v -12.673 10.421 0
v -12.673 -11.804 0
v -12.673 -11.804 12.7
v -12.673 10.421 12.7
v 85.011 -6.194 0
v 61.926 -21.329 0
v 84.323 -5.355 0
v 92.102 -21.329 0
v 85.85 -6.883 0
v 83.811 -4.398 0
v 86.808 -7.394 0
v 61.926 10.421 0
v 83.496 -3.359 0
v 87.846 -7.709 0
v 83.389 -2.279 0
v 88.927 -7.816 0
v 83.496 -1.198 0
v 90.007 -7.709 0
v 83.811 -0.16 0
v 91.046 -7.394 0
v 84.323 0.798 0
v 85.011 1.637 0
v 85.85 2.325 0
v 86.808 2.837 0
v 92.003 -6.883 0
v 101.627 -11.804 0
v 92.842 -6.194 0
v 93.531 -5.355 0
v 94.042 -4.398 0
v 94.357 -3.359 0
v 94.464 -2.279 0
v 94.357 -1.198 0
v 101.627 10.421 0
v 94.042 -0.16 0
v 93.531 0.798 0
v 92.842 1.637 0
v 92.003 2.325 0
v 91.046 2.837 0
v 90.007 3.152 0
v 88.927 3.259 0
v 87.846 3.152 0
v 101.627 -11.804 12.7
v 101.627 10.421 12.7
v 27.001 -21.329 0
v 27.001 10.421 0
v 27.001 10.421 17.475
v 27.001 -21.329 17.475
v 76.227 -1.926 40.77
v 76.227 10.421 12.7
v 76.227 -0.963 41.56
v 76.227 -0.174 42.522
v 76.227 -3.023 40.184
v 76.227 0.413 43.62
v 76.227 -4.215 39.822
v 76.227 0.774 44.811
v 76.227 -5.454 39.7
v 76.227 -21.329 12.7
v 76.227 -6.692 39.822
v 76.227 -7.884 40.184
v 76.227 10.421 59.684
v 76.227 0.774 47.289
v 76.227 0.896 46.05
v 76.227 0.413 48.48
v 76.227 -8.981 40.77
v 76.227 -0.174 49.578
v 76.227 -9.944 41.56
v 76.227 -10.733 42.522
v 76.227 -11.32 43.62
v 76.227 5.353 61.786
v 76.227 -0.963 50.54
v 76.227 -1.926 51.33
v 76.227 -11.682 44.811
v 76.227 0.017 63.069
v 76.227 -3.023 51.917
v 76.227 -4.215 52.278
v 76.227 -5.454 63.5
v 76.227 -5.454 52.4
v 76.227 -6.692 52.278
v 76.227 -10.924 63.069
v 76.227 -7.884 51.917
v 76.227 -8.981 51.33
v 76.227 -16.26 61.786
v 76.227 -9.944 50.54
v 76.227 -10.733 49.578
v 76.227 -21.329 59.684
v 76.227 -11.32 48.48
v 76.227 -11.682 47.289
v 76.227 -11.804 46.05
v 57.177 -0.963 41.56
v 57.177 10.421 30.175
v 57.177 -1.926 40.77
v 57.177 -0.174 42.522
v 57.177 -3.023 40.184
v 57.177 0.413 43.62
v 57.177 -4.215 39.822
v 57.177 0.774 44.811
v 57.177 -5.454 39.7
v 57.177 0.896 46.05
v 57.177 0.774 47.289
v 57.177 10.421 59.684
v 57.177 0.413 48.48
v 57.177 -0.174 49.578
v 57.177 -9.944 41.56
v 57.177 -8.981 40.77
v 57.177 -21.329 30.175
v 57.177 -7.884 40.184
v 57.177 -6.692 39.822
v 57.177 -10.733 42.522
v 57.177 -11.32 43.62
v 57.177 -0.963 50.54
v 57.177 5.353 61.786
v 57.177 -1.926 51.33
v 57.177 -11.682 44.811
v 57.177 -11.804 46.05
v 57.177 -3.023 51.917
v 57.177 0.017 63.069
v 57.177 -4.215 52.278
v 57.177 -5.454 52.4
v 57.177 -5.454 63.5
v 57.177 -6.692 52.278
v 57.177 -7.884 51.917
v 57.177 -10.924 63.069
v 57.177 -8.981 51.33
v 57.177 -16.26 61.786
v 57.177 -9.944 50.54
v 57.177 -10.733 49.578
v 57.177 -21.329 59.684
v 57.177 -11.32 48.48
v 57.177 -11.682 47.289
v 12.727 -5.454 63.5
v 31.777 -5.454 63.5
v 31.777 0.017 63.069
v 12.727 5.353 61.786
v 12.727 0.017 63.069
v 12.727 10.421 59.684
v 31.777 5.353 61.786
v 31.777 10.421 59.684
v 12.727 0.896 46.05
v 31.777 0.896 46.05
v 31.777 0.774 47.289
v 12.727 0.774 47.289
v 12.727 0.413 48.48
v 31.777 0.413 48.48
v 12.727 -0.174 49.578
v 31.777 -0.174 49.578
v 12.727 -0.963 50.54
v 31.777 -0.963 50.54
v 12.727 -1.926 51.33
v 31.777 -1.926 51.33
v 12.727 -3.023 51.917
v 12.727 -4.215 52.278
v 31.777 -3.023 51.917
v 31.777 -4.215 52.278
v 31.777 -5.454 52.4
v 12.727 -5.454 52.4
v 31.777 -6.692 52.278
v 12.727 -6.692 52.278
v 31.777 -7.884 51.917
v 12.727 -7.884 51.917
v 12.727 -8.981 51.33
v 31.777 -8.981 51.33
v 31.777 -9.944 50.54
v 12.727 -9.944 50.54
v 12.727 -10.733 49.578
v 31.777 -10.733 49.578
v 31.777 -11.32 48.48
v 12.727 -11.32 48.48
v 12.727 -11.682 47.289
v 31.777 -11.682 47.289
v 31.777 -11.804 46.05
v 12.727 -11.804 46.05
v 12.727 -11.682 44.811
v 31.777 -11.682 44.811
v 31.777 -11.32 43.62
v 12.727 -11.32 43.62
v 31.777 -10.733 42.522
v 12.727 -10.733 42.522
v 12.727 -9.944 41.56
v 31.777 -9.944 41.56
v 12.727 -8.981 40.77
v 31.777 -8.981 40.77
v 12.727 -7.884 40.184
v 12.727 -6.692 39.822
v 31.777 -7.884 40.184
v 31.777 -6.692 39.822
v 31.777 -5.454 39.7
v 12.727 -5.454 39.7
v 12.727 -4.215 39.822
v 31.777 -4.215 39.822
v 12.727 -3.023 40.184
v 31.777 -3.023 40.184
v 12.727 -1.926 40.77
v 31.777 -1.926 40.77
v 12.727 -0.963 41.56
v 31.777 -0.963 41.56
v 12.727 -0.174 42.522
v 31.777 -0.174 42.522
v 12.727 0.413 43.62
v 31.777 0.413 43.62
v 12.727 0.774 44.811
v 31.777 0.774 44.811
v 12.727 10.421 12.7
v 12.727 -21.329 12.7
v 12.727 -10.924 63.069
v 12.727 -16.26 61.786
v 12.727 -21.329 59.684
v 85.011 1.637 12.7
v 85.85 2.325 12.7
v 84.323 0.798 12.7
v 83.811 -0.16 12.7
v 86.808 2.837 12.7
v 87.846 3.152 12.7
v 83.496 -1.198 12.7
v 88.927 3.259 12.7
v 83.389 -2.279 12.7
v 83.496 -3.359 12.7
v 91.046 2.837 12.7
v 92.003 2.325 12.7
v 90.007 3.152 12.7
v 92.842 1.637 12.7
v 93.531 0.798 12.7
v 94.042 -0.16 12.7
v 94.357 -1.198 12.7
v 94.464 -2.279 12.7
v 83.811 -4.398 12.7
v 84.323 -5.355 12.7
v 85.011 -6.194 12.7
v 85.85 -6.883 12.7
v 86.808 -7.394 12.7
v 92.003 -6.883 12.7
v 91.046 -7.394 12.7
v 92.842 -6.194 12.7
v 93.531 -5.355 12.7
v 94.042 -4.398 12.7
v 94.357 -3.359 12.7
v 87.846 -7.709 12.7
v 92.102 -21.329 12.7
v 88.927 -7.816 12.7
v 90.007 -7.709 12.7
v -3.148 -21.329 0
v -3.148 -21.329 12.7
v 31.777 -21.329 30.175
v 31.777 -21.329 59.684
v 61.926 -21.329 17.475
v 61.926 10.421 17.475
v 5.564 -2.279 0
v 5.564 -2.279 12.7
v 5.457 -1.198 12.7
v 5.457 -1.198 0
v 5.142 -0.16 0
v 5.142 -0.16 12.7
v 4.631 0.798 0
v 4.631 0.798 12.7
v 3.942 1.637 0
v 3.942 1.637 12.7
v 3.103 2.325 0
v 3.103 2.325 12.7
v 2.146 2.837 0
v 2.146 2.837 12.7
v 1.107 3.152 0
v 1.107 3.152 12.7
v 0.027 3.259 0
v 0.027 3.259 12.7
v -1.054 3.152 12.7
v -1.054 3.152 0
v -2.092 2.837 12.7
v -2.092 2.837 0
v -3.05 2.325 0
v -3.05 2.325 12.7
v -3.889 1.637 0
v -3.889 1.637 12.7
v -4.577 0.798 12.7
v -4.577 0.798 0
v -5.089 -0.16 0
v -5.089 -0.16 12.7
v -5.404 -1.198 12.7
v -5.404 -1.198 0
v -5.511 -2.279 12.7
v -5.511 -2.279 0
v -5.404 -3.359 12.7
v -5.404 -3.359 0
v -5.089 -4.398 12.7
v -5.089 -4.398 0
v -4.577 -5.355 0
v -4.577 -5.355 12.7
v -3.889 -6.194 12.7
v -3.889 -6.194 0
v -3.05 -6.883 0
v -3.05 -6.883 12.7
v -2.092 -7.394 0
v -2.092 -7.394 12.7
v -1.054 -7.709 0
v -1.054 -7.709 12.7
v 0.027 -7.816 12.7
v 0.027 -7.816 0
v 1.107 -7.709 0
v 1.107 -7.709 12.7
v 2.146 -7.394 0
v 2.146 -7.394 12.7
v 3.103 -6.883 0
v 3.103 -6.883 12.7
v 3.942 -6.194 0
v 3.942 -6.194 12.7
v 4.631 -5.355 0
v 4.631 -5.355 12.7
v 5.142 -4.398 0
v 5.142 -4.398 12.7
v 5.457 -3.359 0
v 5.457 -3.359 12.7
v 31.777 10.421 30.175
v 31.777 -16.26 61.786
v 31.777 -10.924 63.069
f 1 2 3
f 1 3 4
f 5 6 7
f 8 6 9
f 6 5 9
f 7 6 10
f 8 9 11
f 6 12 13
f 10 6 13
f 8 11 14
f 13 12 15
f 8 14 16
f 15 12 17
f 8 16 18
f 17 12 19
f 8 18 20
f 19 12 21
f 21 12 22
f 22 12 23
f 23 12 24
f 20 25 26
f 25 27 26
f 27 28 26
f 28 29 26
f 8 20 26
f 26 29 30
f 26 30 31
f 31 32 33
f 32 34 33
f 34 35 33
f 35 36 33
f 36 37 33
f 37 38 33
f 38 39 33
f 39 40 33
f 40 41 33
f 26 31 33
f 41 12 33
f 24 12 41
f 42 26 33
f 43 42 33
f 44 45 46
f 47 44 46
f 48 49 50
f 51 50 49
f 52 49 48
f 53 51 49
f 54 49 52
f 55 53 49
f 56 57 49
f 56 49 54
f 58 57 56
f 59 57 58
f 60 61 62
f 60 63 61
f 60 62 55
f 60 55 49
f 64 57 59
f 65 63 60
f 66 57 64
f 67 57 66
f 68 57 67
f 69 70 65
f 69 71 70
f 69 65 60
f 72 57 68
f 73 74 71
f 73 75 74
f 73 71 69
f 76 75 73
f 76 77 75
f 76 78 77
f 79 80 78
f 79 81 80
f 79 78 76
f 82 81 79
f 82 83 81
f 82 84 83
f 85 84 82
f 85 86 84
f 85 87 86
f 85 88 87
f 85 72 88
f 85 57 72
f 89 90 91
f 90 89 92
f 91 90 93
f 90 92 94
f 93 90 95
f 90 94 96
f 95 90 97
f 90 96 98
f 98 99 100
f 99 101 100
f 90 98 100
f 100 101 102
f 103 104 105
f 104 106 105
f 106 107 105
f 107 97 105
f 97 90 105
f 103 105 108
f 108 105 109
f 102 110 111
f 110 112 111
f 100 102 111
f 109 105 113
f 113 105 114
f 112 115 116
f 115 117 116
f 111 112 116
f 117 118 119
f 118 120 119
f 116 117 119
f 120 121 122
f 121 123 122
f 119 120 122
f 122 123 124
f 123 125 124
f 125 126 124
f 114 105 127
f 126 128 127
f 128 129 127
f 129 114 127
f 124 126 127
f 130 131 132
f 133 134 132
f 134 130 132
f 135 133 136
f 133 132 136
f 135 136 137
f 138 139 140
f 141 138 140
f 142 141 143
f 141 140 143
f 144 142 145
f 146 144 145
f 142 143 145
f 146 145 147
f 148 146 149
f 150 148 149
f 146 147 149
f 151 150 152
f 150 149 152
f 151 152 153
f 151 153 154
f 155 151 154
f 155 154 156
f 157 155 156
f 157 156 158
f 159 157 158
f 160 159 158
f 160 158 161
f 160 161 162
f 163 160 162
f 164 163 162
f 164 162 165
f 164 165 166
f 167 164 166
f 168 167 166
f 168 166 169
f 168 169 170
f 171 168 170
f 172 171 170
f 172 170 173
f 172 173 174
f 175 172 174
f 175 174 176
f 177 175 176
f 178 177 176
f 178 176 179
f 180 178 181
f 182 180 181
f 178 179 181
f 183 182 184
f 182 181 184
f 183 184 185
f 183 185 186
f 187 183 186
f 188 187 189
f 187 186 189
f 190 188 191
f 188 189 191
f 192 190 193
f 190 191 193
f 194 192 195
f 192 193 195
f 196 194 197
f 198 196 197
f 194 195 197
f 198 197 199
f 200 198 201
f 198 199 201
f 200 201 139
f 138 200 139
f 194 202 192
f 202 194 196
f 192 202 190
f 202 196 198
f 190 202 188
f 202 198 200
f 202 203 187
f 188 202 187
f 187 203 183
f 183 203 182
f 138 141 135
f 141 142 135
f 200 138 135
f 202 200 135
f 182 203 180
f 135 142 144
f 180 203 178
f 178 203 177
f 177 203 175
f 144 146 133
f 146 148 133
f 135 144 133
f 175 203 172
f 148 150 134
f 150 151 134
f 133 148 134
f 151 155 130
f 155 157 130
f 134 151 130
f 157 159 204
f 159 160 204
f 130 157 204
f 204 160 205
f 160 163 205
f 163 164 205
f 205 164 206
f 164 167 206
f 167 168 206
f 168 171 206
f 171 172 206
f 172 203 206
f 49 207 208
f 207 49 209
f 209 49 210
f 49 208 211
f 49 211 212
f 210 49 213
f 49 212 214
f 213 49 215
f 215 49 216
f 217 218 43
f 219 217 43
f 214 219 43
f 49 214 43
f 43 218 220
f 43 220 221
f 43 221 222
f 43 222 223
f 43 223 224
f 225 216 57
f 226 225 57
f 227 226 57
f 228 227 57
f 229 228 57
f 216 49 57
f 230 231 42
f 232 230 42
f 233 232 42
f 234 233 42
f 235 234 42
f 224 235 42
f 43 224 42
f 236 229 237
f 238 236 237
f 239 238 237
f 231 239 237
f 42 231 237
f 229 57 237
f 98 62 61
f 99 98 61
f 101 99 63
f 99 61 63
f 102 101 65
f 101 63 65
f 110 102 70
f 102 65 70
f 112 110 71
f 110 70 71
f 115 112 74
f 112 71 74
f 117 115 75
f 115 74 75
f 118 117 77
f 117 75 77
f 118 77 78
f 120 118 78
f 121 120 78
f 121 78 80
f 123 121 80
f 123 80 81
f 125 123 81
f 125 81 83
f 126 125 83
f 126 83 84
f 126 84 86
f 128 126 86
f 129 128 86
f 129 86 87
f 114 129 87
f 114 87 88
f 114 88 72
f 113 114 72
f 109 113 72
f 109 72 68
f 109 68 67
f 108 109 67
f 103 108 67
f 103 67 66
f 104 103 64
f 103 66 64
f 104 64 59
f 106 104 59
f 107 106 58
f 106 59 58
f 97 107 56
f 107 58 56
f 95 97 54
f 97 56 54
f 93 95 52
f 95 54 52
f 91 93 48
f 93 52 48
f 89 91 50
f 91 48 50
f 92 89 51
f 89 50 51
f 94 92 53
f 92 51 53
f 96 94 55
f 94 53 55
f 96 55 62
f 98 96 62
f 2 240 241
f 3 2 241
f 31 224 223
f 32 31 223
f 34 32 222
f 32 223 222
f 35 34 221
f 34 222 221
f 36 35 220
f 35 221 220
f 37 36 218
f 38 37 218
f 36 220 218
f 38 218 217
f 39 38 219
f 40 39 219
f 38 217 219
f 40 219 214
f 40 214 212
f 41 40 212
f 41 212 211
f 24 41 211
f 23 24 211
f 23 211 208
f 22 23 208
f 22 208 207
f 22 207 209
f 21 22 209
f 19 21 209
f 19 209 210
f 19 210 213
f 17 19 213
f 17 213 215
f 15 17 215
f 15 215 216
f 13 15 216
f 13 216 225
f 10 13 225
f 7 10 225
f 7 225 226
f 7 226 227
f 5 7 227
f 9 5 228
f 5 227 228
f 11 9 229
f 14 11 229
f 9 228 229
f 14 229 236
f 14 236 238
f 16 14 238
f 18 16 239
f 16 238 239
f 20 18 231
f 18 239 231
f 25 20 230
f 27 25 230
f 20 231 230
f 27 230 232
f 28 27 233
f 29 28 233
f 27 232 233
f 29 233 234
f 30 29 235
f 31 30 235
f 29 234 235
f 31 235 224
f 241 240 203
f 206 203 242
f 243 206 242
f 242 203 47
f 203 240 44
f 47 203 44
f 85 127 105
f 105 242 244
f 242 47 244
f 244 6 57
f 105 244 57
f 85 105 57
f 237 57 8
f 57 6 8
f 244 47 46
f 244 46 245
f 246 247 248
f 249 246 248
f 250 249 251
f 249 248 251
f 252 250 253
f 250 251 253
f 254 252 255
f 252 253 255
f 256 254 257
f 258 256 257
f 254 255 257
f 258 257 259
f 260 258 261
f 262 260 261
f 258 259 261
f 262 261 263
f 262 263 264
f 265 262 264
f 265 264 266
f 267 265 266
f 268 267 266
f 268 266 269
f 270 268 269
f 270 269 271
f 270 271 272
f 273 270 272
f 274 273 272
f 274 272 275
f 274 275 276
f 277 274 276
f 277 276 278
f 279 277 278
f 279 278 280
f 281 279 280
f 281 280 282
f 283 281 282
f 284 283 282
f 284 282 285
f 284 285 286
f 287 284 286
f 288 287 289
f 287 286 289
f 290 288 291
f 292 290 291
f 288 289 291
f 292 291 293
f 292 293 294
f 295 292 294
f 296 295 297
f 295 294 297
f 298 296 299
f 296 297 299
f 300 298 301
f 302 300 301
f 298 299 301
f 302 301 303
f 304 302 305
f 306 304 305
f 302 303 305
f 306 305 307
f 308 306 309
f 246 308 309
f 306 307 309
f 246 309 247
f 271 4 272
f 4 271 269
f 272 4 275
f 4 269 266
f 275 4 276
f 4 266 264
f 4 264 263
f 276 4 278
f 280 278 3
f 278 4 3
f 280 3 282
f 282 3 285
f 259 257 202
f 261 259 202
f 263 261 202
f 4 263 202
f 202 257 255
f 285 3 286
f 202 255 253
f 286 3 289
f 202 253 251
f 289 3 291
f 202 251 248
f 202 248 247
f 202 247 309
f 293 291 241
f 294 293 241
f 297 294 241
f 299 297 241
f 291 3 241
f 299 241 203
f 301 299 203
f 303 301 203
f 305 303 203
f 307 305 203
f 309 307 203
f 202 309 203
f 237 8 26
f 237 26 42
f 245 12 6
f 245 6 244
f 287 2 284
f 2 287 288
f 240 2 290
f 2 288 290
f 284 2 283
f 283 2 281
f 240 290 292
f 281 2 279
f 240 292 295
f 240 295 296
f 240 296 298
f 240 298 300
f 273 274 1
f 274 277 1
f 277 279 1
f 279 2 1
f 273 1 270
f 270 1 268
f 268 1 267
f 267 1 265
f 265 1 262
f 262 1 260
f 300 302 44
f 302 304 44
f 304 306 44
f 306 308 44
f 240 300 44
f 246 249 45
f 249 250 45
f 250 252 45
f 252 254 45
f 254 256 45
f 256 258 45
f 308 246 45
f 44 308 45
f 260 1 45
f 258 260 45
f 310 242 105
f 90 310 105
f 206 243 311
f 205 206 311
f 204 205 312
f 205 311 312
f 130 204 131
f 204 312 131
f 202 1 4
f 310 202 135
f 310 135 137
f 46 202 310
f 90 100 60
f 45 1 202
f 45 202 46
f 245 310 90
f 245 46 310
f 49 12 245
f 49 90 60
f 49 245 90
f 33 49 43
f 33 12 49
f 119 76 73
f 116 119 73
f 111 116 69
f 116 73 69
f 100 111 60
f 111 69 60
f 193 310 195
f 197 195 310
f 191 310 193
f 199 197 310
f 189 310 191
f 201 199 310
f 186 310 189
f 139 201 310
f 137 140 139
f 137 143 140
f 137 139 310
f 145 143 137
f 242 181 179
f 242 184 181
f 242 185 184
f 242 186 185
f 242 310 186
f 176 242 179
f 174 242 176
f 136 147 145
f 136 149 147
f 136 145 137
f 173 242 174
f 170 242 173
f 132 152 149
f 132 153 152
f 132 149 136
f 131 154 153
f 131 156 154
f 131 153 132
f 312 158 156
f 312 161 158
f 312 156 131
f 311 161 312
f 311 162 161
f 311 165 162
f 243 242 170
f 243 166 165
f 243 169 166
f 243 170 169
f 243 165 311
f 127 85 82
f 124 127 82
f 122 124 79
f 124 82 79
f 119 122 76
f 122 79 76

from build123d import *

# Parameters (mm, degrees)
F0_W     = 114.3
F0_H     = 31.75
F1_DEPTH = 63.5
F2_W     = 25.4
F2_H     = 50.8
F2_H_2   = 33.3248
F2_W_2   = 34.925
F2_H_3   = 17.4752
F3_DEPTH = 31.751
F4_R     = 6.35
F5_DEPTH = 88.901
F6_R     = 5.5372
F7_DEPTH = 12.701
F9_DEPTH = 88.901
F10_SIZE = 9.525


with BuildPart() as f1:
    # F0 (on Top) → F1 (new body)
    with BuildSketch(Plane.XY):
        with Locations((44.4766530171, -5.4535213858)):
            Rectangle(F0_W, F0_H)
    extrude(amount=F1_DEPTH)

    # F2 (on face) → F3 (cut, through all)
    with BuildSketch(Plane.XZ.offset(21.3285213858)):
        with Locations((0.0266530171, 38.1)):
            Rectangle(F2_W, F2_H)
        with Locations((44.4766530171, 46.8376)):
            Rectangle(F2_W, F2_H_2)
        with Locations((88.9266530171, 38.1)):
            Rectangle(F2_W, F2_H)
        with Locations((44.4639530171, 8.7376)):
            Rectangle(F2_W_2, F2_H_3)
    extrude(amount=-F3_DEPTH, mode=Mode.SUBTRACT)

    # F4 (on face) → F5 (cut, through all)
    with BuildSketch(Plane.YZ.offset(76.2266530171)):
        with Locations((-5.4535213858, 46.0502)):
            Circle(F4_R)
    extrude(amount=-F5_DEPTH, mode=Mode.SUBTRACT)

    # F6 (on face) → F7 (cut, through all)
    with BuildSketch(Plane.XY.offset(12.7)):
        with Locations((0.0266530171, -2.2785213858)):
            Circle(F6_R)
        with Locations((88.9266530171, -2.2785213858)):
            Circle(F6_R)
    extrude(amount=-F7_DEPTH, mode=Mode.SUBTRACT)

    # F8 (on face) → F9 (cut, through all)
    with BuildSketch(Plane.YZ.offset(76.2266530171)):
        with BuildLine():
            Line((-21.3285213858, 63.5), (-21.3285213858, 59.6835197333))
            ThreePointArc((-21.3285213858, 59.6835197333), (-13.6171777345, 62.5324784108), (-5.4535211745, 63.5))
            Line((-5.4535211745, 63.5), (-21.3285213858, 63.5))
        make_face()
        with BuildLine():
            ThreePointArc((-5.4535211745, 63.5), (2.7101351683, 62.5324783614), (10.4214786142, 59.6835197333))
            Line((10.4214786142, 59.6835197333), (10.4214786142, 63.5))
            Line((10.4214786142, 63.5), (-5.4535211745, 63.5))
        make_face()
    extrude(amount=-F9_DEPTH, mode=Mode.SUBTRACT)

    # F10
    f10_edges = [f1.edges().sort_by_distance(p)[0] for p in [
        (101.626653, -21.328521, 6.35),
        (-12.673347, -21.328521, 6.35),
    ]]
    chamfer(f10_edges, length=F10_SIZE)


solid = f1.part
